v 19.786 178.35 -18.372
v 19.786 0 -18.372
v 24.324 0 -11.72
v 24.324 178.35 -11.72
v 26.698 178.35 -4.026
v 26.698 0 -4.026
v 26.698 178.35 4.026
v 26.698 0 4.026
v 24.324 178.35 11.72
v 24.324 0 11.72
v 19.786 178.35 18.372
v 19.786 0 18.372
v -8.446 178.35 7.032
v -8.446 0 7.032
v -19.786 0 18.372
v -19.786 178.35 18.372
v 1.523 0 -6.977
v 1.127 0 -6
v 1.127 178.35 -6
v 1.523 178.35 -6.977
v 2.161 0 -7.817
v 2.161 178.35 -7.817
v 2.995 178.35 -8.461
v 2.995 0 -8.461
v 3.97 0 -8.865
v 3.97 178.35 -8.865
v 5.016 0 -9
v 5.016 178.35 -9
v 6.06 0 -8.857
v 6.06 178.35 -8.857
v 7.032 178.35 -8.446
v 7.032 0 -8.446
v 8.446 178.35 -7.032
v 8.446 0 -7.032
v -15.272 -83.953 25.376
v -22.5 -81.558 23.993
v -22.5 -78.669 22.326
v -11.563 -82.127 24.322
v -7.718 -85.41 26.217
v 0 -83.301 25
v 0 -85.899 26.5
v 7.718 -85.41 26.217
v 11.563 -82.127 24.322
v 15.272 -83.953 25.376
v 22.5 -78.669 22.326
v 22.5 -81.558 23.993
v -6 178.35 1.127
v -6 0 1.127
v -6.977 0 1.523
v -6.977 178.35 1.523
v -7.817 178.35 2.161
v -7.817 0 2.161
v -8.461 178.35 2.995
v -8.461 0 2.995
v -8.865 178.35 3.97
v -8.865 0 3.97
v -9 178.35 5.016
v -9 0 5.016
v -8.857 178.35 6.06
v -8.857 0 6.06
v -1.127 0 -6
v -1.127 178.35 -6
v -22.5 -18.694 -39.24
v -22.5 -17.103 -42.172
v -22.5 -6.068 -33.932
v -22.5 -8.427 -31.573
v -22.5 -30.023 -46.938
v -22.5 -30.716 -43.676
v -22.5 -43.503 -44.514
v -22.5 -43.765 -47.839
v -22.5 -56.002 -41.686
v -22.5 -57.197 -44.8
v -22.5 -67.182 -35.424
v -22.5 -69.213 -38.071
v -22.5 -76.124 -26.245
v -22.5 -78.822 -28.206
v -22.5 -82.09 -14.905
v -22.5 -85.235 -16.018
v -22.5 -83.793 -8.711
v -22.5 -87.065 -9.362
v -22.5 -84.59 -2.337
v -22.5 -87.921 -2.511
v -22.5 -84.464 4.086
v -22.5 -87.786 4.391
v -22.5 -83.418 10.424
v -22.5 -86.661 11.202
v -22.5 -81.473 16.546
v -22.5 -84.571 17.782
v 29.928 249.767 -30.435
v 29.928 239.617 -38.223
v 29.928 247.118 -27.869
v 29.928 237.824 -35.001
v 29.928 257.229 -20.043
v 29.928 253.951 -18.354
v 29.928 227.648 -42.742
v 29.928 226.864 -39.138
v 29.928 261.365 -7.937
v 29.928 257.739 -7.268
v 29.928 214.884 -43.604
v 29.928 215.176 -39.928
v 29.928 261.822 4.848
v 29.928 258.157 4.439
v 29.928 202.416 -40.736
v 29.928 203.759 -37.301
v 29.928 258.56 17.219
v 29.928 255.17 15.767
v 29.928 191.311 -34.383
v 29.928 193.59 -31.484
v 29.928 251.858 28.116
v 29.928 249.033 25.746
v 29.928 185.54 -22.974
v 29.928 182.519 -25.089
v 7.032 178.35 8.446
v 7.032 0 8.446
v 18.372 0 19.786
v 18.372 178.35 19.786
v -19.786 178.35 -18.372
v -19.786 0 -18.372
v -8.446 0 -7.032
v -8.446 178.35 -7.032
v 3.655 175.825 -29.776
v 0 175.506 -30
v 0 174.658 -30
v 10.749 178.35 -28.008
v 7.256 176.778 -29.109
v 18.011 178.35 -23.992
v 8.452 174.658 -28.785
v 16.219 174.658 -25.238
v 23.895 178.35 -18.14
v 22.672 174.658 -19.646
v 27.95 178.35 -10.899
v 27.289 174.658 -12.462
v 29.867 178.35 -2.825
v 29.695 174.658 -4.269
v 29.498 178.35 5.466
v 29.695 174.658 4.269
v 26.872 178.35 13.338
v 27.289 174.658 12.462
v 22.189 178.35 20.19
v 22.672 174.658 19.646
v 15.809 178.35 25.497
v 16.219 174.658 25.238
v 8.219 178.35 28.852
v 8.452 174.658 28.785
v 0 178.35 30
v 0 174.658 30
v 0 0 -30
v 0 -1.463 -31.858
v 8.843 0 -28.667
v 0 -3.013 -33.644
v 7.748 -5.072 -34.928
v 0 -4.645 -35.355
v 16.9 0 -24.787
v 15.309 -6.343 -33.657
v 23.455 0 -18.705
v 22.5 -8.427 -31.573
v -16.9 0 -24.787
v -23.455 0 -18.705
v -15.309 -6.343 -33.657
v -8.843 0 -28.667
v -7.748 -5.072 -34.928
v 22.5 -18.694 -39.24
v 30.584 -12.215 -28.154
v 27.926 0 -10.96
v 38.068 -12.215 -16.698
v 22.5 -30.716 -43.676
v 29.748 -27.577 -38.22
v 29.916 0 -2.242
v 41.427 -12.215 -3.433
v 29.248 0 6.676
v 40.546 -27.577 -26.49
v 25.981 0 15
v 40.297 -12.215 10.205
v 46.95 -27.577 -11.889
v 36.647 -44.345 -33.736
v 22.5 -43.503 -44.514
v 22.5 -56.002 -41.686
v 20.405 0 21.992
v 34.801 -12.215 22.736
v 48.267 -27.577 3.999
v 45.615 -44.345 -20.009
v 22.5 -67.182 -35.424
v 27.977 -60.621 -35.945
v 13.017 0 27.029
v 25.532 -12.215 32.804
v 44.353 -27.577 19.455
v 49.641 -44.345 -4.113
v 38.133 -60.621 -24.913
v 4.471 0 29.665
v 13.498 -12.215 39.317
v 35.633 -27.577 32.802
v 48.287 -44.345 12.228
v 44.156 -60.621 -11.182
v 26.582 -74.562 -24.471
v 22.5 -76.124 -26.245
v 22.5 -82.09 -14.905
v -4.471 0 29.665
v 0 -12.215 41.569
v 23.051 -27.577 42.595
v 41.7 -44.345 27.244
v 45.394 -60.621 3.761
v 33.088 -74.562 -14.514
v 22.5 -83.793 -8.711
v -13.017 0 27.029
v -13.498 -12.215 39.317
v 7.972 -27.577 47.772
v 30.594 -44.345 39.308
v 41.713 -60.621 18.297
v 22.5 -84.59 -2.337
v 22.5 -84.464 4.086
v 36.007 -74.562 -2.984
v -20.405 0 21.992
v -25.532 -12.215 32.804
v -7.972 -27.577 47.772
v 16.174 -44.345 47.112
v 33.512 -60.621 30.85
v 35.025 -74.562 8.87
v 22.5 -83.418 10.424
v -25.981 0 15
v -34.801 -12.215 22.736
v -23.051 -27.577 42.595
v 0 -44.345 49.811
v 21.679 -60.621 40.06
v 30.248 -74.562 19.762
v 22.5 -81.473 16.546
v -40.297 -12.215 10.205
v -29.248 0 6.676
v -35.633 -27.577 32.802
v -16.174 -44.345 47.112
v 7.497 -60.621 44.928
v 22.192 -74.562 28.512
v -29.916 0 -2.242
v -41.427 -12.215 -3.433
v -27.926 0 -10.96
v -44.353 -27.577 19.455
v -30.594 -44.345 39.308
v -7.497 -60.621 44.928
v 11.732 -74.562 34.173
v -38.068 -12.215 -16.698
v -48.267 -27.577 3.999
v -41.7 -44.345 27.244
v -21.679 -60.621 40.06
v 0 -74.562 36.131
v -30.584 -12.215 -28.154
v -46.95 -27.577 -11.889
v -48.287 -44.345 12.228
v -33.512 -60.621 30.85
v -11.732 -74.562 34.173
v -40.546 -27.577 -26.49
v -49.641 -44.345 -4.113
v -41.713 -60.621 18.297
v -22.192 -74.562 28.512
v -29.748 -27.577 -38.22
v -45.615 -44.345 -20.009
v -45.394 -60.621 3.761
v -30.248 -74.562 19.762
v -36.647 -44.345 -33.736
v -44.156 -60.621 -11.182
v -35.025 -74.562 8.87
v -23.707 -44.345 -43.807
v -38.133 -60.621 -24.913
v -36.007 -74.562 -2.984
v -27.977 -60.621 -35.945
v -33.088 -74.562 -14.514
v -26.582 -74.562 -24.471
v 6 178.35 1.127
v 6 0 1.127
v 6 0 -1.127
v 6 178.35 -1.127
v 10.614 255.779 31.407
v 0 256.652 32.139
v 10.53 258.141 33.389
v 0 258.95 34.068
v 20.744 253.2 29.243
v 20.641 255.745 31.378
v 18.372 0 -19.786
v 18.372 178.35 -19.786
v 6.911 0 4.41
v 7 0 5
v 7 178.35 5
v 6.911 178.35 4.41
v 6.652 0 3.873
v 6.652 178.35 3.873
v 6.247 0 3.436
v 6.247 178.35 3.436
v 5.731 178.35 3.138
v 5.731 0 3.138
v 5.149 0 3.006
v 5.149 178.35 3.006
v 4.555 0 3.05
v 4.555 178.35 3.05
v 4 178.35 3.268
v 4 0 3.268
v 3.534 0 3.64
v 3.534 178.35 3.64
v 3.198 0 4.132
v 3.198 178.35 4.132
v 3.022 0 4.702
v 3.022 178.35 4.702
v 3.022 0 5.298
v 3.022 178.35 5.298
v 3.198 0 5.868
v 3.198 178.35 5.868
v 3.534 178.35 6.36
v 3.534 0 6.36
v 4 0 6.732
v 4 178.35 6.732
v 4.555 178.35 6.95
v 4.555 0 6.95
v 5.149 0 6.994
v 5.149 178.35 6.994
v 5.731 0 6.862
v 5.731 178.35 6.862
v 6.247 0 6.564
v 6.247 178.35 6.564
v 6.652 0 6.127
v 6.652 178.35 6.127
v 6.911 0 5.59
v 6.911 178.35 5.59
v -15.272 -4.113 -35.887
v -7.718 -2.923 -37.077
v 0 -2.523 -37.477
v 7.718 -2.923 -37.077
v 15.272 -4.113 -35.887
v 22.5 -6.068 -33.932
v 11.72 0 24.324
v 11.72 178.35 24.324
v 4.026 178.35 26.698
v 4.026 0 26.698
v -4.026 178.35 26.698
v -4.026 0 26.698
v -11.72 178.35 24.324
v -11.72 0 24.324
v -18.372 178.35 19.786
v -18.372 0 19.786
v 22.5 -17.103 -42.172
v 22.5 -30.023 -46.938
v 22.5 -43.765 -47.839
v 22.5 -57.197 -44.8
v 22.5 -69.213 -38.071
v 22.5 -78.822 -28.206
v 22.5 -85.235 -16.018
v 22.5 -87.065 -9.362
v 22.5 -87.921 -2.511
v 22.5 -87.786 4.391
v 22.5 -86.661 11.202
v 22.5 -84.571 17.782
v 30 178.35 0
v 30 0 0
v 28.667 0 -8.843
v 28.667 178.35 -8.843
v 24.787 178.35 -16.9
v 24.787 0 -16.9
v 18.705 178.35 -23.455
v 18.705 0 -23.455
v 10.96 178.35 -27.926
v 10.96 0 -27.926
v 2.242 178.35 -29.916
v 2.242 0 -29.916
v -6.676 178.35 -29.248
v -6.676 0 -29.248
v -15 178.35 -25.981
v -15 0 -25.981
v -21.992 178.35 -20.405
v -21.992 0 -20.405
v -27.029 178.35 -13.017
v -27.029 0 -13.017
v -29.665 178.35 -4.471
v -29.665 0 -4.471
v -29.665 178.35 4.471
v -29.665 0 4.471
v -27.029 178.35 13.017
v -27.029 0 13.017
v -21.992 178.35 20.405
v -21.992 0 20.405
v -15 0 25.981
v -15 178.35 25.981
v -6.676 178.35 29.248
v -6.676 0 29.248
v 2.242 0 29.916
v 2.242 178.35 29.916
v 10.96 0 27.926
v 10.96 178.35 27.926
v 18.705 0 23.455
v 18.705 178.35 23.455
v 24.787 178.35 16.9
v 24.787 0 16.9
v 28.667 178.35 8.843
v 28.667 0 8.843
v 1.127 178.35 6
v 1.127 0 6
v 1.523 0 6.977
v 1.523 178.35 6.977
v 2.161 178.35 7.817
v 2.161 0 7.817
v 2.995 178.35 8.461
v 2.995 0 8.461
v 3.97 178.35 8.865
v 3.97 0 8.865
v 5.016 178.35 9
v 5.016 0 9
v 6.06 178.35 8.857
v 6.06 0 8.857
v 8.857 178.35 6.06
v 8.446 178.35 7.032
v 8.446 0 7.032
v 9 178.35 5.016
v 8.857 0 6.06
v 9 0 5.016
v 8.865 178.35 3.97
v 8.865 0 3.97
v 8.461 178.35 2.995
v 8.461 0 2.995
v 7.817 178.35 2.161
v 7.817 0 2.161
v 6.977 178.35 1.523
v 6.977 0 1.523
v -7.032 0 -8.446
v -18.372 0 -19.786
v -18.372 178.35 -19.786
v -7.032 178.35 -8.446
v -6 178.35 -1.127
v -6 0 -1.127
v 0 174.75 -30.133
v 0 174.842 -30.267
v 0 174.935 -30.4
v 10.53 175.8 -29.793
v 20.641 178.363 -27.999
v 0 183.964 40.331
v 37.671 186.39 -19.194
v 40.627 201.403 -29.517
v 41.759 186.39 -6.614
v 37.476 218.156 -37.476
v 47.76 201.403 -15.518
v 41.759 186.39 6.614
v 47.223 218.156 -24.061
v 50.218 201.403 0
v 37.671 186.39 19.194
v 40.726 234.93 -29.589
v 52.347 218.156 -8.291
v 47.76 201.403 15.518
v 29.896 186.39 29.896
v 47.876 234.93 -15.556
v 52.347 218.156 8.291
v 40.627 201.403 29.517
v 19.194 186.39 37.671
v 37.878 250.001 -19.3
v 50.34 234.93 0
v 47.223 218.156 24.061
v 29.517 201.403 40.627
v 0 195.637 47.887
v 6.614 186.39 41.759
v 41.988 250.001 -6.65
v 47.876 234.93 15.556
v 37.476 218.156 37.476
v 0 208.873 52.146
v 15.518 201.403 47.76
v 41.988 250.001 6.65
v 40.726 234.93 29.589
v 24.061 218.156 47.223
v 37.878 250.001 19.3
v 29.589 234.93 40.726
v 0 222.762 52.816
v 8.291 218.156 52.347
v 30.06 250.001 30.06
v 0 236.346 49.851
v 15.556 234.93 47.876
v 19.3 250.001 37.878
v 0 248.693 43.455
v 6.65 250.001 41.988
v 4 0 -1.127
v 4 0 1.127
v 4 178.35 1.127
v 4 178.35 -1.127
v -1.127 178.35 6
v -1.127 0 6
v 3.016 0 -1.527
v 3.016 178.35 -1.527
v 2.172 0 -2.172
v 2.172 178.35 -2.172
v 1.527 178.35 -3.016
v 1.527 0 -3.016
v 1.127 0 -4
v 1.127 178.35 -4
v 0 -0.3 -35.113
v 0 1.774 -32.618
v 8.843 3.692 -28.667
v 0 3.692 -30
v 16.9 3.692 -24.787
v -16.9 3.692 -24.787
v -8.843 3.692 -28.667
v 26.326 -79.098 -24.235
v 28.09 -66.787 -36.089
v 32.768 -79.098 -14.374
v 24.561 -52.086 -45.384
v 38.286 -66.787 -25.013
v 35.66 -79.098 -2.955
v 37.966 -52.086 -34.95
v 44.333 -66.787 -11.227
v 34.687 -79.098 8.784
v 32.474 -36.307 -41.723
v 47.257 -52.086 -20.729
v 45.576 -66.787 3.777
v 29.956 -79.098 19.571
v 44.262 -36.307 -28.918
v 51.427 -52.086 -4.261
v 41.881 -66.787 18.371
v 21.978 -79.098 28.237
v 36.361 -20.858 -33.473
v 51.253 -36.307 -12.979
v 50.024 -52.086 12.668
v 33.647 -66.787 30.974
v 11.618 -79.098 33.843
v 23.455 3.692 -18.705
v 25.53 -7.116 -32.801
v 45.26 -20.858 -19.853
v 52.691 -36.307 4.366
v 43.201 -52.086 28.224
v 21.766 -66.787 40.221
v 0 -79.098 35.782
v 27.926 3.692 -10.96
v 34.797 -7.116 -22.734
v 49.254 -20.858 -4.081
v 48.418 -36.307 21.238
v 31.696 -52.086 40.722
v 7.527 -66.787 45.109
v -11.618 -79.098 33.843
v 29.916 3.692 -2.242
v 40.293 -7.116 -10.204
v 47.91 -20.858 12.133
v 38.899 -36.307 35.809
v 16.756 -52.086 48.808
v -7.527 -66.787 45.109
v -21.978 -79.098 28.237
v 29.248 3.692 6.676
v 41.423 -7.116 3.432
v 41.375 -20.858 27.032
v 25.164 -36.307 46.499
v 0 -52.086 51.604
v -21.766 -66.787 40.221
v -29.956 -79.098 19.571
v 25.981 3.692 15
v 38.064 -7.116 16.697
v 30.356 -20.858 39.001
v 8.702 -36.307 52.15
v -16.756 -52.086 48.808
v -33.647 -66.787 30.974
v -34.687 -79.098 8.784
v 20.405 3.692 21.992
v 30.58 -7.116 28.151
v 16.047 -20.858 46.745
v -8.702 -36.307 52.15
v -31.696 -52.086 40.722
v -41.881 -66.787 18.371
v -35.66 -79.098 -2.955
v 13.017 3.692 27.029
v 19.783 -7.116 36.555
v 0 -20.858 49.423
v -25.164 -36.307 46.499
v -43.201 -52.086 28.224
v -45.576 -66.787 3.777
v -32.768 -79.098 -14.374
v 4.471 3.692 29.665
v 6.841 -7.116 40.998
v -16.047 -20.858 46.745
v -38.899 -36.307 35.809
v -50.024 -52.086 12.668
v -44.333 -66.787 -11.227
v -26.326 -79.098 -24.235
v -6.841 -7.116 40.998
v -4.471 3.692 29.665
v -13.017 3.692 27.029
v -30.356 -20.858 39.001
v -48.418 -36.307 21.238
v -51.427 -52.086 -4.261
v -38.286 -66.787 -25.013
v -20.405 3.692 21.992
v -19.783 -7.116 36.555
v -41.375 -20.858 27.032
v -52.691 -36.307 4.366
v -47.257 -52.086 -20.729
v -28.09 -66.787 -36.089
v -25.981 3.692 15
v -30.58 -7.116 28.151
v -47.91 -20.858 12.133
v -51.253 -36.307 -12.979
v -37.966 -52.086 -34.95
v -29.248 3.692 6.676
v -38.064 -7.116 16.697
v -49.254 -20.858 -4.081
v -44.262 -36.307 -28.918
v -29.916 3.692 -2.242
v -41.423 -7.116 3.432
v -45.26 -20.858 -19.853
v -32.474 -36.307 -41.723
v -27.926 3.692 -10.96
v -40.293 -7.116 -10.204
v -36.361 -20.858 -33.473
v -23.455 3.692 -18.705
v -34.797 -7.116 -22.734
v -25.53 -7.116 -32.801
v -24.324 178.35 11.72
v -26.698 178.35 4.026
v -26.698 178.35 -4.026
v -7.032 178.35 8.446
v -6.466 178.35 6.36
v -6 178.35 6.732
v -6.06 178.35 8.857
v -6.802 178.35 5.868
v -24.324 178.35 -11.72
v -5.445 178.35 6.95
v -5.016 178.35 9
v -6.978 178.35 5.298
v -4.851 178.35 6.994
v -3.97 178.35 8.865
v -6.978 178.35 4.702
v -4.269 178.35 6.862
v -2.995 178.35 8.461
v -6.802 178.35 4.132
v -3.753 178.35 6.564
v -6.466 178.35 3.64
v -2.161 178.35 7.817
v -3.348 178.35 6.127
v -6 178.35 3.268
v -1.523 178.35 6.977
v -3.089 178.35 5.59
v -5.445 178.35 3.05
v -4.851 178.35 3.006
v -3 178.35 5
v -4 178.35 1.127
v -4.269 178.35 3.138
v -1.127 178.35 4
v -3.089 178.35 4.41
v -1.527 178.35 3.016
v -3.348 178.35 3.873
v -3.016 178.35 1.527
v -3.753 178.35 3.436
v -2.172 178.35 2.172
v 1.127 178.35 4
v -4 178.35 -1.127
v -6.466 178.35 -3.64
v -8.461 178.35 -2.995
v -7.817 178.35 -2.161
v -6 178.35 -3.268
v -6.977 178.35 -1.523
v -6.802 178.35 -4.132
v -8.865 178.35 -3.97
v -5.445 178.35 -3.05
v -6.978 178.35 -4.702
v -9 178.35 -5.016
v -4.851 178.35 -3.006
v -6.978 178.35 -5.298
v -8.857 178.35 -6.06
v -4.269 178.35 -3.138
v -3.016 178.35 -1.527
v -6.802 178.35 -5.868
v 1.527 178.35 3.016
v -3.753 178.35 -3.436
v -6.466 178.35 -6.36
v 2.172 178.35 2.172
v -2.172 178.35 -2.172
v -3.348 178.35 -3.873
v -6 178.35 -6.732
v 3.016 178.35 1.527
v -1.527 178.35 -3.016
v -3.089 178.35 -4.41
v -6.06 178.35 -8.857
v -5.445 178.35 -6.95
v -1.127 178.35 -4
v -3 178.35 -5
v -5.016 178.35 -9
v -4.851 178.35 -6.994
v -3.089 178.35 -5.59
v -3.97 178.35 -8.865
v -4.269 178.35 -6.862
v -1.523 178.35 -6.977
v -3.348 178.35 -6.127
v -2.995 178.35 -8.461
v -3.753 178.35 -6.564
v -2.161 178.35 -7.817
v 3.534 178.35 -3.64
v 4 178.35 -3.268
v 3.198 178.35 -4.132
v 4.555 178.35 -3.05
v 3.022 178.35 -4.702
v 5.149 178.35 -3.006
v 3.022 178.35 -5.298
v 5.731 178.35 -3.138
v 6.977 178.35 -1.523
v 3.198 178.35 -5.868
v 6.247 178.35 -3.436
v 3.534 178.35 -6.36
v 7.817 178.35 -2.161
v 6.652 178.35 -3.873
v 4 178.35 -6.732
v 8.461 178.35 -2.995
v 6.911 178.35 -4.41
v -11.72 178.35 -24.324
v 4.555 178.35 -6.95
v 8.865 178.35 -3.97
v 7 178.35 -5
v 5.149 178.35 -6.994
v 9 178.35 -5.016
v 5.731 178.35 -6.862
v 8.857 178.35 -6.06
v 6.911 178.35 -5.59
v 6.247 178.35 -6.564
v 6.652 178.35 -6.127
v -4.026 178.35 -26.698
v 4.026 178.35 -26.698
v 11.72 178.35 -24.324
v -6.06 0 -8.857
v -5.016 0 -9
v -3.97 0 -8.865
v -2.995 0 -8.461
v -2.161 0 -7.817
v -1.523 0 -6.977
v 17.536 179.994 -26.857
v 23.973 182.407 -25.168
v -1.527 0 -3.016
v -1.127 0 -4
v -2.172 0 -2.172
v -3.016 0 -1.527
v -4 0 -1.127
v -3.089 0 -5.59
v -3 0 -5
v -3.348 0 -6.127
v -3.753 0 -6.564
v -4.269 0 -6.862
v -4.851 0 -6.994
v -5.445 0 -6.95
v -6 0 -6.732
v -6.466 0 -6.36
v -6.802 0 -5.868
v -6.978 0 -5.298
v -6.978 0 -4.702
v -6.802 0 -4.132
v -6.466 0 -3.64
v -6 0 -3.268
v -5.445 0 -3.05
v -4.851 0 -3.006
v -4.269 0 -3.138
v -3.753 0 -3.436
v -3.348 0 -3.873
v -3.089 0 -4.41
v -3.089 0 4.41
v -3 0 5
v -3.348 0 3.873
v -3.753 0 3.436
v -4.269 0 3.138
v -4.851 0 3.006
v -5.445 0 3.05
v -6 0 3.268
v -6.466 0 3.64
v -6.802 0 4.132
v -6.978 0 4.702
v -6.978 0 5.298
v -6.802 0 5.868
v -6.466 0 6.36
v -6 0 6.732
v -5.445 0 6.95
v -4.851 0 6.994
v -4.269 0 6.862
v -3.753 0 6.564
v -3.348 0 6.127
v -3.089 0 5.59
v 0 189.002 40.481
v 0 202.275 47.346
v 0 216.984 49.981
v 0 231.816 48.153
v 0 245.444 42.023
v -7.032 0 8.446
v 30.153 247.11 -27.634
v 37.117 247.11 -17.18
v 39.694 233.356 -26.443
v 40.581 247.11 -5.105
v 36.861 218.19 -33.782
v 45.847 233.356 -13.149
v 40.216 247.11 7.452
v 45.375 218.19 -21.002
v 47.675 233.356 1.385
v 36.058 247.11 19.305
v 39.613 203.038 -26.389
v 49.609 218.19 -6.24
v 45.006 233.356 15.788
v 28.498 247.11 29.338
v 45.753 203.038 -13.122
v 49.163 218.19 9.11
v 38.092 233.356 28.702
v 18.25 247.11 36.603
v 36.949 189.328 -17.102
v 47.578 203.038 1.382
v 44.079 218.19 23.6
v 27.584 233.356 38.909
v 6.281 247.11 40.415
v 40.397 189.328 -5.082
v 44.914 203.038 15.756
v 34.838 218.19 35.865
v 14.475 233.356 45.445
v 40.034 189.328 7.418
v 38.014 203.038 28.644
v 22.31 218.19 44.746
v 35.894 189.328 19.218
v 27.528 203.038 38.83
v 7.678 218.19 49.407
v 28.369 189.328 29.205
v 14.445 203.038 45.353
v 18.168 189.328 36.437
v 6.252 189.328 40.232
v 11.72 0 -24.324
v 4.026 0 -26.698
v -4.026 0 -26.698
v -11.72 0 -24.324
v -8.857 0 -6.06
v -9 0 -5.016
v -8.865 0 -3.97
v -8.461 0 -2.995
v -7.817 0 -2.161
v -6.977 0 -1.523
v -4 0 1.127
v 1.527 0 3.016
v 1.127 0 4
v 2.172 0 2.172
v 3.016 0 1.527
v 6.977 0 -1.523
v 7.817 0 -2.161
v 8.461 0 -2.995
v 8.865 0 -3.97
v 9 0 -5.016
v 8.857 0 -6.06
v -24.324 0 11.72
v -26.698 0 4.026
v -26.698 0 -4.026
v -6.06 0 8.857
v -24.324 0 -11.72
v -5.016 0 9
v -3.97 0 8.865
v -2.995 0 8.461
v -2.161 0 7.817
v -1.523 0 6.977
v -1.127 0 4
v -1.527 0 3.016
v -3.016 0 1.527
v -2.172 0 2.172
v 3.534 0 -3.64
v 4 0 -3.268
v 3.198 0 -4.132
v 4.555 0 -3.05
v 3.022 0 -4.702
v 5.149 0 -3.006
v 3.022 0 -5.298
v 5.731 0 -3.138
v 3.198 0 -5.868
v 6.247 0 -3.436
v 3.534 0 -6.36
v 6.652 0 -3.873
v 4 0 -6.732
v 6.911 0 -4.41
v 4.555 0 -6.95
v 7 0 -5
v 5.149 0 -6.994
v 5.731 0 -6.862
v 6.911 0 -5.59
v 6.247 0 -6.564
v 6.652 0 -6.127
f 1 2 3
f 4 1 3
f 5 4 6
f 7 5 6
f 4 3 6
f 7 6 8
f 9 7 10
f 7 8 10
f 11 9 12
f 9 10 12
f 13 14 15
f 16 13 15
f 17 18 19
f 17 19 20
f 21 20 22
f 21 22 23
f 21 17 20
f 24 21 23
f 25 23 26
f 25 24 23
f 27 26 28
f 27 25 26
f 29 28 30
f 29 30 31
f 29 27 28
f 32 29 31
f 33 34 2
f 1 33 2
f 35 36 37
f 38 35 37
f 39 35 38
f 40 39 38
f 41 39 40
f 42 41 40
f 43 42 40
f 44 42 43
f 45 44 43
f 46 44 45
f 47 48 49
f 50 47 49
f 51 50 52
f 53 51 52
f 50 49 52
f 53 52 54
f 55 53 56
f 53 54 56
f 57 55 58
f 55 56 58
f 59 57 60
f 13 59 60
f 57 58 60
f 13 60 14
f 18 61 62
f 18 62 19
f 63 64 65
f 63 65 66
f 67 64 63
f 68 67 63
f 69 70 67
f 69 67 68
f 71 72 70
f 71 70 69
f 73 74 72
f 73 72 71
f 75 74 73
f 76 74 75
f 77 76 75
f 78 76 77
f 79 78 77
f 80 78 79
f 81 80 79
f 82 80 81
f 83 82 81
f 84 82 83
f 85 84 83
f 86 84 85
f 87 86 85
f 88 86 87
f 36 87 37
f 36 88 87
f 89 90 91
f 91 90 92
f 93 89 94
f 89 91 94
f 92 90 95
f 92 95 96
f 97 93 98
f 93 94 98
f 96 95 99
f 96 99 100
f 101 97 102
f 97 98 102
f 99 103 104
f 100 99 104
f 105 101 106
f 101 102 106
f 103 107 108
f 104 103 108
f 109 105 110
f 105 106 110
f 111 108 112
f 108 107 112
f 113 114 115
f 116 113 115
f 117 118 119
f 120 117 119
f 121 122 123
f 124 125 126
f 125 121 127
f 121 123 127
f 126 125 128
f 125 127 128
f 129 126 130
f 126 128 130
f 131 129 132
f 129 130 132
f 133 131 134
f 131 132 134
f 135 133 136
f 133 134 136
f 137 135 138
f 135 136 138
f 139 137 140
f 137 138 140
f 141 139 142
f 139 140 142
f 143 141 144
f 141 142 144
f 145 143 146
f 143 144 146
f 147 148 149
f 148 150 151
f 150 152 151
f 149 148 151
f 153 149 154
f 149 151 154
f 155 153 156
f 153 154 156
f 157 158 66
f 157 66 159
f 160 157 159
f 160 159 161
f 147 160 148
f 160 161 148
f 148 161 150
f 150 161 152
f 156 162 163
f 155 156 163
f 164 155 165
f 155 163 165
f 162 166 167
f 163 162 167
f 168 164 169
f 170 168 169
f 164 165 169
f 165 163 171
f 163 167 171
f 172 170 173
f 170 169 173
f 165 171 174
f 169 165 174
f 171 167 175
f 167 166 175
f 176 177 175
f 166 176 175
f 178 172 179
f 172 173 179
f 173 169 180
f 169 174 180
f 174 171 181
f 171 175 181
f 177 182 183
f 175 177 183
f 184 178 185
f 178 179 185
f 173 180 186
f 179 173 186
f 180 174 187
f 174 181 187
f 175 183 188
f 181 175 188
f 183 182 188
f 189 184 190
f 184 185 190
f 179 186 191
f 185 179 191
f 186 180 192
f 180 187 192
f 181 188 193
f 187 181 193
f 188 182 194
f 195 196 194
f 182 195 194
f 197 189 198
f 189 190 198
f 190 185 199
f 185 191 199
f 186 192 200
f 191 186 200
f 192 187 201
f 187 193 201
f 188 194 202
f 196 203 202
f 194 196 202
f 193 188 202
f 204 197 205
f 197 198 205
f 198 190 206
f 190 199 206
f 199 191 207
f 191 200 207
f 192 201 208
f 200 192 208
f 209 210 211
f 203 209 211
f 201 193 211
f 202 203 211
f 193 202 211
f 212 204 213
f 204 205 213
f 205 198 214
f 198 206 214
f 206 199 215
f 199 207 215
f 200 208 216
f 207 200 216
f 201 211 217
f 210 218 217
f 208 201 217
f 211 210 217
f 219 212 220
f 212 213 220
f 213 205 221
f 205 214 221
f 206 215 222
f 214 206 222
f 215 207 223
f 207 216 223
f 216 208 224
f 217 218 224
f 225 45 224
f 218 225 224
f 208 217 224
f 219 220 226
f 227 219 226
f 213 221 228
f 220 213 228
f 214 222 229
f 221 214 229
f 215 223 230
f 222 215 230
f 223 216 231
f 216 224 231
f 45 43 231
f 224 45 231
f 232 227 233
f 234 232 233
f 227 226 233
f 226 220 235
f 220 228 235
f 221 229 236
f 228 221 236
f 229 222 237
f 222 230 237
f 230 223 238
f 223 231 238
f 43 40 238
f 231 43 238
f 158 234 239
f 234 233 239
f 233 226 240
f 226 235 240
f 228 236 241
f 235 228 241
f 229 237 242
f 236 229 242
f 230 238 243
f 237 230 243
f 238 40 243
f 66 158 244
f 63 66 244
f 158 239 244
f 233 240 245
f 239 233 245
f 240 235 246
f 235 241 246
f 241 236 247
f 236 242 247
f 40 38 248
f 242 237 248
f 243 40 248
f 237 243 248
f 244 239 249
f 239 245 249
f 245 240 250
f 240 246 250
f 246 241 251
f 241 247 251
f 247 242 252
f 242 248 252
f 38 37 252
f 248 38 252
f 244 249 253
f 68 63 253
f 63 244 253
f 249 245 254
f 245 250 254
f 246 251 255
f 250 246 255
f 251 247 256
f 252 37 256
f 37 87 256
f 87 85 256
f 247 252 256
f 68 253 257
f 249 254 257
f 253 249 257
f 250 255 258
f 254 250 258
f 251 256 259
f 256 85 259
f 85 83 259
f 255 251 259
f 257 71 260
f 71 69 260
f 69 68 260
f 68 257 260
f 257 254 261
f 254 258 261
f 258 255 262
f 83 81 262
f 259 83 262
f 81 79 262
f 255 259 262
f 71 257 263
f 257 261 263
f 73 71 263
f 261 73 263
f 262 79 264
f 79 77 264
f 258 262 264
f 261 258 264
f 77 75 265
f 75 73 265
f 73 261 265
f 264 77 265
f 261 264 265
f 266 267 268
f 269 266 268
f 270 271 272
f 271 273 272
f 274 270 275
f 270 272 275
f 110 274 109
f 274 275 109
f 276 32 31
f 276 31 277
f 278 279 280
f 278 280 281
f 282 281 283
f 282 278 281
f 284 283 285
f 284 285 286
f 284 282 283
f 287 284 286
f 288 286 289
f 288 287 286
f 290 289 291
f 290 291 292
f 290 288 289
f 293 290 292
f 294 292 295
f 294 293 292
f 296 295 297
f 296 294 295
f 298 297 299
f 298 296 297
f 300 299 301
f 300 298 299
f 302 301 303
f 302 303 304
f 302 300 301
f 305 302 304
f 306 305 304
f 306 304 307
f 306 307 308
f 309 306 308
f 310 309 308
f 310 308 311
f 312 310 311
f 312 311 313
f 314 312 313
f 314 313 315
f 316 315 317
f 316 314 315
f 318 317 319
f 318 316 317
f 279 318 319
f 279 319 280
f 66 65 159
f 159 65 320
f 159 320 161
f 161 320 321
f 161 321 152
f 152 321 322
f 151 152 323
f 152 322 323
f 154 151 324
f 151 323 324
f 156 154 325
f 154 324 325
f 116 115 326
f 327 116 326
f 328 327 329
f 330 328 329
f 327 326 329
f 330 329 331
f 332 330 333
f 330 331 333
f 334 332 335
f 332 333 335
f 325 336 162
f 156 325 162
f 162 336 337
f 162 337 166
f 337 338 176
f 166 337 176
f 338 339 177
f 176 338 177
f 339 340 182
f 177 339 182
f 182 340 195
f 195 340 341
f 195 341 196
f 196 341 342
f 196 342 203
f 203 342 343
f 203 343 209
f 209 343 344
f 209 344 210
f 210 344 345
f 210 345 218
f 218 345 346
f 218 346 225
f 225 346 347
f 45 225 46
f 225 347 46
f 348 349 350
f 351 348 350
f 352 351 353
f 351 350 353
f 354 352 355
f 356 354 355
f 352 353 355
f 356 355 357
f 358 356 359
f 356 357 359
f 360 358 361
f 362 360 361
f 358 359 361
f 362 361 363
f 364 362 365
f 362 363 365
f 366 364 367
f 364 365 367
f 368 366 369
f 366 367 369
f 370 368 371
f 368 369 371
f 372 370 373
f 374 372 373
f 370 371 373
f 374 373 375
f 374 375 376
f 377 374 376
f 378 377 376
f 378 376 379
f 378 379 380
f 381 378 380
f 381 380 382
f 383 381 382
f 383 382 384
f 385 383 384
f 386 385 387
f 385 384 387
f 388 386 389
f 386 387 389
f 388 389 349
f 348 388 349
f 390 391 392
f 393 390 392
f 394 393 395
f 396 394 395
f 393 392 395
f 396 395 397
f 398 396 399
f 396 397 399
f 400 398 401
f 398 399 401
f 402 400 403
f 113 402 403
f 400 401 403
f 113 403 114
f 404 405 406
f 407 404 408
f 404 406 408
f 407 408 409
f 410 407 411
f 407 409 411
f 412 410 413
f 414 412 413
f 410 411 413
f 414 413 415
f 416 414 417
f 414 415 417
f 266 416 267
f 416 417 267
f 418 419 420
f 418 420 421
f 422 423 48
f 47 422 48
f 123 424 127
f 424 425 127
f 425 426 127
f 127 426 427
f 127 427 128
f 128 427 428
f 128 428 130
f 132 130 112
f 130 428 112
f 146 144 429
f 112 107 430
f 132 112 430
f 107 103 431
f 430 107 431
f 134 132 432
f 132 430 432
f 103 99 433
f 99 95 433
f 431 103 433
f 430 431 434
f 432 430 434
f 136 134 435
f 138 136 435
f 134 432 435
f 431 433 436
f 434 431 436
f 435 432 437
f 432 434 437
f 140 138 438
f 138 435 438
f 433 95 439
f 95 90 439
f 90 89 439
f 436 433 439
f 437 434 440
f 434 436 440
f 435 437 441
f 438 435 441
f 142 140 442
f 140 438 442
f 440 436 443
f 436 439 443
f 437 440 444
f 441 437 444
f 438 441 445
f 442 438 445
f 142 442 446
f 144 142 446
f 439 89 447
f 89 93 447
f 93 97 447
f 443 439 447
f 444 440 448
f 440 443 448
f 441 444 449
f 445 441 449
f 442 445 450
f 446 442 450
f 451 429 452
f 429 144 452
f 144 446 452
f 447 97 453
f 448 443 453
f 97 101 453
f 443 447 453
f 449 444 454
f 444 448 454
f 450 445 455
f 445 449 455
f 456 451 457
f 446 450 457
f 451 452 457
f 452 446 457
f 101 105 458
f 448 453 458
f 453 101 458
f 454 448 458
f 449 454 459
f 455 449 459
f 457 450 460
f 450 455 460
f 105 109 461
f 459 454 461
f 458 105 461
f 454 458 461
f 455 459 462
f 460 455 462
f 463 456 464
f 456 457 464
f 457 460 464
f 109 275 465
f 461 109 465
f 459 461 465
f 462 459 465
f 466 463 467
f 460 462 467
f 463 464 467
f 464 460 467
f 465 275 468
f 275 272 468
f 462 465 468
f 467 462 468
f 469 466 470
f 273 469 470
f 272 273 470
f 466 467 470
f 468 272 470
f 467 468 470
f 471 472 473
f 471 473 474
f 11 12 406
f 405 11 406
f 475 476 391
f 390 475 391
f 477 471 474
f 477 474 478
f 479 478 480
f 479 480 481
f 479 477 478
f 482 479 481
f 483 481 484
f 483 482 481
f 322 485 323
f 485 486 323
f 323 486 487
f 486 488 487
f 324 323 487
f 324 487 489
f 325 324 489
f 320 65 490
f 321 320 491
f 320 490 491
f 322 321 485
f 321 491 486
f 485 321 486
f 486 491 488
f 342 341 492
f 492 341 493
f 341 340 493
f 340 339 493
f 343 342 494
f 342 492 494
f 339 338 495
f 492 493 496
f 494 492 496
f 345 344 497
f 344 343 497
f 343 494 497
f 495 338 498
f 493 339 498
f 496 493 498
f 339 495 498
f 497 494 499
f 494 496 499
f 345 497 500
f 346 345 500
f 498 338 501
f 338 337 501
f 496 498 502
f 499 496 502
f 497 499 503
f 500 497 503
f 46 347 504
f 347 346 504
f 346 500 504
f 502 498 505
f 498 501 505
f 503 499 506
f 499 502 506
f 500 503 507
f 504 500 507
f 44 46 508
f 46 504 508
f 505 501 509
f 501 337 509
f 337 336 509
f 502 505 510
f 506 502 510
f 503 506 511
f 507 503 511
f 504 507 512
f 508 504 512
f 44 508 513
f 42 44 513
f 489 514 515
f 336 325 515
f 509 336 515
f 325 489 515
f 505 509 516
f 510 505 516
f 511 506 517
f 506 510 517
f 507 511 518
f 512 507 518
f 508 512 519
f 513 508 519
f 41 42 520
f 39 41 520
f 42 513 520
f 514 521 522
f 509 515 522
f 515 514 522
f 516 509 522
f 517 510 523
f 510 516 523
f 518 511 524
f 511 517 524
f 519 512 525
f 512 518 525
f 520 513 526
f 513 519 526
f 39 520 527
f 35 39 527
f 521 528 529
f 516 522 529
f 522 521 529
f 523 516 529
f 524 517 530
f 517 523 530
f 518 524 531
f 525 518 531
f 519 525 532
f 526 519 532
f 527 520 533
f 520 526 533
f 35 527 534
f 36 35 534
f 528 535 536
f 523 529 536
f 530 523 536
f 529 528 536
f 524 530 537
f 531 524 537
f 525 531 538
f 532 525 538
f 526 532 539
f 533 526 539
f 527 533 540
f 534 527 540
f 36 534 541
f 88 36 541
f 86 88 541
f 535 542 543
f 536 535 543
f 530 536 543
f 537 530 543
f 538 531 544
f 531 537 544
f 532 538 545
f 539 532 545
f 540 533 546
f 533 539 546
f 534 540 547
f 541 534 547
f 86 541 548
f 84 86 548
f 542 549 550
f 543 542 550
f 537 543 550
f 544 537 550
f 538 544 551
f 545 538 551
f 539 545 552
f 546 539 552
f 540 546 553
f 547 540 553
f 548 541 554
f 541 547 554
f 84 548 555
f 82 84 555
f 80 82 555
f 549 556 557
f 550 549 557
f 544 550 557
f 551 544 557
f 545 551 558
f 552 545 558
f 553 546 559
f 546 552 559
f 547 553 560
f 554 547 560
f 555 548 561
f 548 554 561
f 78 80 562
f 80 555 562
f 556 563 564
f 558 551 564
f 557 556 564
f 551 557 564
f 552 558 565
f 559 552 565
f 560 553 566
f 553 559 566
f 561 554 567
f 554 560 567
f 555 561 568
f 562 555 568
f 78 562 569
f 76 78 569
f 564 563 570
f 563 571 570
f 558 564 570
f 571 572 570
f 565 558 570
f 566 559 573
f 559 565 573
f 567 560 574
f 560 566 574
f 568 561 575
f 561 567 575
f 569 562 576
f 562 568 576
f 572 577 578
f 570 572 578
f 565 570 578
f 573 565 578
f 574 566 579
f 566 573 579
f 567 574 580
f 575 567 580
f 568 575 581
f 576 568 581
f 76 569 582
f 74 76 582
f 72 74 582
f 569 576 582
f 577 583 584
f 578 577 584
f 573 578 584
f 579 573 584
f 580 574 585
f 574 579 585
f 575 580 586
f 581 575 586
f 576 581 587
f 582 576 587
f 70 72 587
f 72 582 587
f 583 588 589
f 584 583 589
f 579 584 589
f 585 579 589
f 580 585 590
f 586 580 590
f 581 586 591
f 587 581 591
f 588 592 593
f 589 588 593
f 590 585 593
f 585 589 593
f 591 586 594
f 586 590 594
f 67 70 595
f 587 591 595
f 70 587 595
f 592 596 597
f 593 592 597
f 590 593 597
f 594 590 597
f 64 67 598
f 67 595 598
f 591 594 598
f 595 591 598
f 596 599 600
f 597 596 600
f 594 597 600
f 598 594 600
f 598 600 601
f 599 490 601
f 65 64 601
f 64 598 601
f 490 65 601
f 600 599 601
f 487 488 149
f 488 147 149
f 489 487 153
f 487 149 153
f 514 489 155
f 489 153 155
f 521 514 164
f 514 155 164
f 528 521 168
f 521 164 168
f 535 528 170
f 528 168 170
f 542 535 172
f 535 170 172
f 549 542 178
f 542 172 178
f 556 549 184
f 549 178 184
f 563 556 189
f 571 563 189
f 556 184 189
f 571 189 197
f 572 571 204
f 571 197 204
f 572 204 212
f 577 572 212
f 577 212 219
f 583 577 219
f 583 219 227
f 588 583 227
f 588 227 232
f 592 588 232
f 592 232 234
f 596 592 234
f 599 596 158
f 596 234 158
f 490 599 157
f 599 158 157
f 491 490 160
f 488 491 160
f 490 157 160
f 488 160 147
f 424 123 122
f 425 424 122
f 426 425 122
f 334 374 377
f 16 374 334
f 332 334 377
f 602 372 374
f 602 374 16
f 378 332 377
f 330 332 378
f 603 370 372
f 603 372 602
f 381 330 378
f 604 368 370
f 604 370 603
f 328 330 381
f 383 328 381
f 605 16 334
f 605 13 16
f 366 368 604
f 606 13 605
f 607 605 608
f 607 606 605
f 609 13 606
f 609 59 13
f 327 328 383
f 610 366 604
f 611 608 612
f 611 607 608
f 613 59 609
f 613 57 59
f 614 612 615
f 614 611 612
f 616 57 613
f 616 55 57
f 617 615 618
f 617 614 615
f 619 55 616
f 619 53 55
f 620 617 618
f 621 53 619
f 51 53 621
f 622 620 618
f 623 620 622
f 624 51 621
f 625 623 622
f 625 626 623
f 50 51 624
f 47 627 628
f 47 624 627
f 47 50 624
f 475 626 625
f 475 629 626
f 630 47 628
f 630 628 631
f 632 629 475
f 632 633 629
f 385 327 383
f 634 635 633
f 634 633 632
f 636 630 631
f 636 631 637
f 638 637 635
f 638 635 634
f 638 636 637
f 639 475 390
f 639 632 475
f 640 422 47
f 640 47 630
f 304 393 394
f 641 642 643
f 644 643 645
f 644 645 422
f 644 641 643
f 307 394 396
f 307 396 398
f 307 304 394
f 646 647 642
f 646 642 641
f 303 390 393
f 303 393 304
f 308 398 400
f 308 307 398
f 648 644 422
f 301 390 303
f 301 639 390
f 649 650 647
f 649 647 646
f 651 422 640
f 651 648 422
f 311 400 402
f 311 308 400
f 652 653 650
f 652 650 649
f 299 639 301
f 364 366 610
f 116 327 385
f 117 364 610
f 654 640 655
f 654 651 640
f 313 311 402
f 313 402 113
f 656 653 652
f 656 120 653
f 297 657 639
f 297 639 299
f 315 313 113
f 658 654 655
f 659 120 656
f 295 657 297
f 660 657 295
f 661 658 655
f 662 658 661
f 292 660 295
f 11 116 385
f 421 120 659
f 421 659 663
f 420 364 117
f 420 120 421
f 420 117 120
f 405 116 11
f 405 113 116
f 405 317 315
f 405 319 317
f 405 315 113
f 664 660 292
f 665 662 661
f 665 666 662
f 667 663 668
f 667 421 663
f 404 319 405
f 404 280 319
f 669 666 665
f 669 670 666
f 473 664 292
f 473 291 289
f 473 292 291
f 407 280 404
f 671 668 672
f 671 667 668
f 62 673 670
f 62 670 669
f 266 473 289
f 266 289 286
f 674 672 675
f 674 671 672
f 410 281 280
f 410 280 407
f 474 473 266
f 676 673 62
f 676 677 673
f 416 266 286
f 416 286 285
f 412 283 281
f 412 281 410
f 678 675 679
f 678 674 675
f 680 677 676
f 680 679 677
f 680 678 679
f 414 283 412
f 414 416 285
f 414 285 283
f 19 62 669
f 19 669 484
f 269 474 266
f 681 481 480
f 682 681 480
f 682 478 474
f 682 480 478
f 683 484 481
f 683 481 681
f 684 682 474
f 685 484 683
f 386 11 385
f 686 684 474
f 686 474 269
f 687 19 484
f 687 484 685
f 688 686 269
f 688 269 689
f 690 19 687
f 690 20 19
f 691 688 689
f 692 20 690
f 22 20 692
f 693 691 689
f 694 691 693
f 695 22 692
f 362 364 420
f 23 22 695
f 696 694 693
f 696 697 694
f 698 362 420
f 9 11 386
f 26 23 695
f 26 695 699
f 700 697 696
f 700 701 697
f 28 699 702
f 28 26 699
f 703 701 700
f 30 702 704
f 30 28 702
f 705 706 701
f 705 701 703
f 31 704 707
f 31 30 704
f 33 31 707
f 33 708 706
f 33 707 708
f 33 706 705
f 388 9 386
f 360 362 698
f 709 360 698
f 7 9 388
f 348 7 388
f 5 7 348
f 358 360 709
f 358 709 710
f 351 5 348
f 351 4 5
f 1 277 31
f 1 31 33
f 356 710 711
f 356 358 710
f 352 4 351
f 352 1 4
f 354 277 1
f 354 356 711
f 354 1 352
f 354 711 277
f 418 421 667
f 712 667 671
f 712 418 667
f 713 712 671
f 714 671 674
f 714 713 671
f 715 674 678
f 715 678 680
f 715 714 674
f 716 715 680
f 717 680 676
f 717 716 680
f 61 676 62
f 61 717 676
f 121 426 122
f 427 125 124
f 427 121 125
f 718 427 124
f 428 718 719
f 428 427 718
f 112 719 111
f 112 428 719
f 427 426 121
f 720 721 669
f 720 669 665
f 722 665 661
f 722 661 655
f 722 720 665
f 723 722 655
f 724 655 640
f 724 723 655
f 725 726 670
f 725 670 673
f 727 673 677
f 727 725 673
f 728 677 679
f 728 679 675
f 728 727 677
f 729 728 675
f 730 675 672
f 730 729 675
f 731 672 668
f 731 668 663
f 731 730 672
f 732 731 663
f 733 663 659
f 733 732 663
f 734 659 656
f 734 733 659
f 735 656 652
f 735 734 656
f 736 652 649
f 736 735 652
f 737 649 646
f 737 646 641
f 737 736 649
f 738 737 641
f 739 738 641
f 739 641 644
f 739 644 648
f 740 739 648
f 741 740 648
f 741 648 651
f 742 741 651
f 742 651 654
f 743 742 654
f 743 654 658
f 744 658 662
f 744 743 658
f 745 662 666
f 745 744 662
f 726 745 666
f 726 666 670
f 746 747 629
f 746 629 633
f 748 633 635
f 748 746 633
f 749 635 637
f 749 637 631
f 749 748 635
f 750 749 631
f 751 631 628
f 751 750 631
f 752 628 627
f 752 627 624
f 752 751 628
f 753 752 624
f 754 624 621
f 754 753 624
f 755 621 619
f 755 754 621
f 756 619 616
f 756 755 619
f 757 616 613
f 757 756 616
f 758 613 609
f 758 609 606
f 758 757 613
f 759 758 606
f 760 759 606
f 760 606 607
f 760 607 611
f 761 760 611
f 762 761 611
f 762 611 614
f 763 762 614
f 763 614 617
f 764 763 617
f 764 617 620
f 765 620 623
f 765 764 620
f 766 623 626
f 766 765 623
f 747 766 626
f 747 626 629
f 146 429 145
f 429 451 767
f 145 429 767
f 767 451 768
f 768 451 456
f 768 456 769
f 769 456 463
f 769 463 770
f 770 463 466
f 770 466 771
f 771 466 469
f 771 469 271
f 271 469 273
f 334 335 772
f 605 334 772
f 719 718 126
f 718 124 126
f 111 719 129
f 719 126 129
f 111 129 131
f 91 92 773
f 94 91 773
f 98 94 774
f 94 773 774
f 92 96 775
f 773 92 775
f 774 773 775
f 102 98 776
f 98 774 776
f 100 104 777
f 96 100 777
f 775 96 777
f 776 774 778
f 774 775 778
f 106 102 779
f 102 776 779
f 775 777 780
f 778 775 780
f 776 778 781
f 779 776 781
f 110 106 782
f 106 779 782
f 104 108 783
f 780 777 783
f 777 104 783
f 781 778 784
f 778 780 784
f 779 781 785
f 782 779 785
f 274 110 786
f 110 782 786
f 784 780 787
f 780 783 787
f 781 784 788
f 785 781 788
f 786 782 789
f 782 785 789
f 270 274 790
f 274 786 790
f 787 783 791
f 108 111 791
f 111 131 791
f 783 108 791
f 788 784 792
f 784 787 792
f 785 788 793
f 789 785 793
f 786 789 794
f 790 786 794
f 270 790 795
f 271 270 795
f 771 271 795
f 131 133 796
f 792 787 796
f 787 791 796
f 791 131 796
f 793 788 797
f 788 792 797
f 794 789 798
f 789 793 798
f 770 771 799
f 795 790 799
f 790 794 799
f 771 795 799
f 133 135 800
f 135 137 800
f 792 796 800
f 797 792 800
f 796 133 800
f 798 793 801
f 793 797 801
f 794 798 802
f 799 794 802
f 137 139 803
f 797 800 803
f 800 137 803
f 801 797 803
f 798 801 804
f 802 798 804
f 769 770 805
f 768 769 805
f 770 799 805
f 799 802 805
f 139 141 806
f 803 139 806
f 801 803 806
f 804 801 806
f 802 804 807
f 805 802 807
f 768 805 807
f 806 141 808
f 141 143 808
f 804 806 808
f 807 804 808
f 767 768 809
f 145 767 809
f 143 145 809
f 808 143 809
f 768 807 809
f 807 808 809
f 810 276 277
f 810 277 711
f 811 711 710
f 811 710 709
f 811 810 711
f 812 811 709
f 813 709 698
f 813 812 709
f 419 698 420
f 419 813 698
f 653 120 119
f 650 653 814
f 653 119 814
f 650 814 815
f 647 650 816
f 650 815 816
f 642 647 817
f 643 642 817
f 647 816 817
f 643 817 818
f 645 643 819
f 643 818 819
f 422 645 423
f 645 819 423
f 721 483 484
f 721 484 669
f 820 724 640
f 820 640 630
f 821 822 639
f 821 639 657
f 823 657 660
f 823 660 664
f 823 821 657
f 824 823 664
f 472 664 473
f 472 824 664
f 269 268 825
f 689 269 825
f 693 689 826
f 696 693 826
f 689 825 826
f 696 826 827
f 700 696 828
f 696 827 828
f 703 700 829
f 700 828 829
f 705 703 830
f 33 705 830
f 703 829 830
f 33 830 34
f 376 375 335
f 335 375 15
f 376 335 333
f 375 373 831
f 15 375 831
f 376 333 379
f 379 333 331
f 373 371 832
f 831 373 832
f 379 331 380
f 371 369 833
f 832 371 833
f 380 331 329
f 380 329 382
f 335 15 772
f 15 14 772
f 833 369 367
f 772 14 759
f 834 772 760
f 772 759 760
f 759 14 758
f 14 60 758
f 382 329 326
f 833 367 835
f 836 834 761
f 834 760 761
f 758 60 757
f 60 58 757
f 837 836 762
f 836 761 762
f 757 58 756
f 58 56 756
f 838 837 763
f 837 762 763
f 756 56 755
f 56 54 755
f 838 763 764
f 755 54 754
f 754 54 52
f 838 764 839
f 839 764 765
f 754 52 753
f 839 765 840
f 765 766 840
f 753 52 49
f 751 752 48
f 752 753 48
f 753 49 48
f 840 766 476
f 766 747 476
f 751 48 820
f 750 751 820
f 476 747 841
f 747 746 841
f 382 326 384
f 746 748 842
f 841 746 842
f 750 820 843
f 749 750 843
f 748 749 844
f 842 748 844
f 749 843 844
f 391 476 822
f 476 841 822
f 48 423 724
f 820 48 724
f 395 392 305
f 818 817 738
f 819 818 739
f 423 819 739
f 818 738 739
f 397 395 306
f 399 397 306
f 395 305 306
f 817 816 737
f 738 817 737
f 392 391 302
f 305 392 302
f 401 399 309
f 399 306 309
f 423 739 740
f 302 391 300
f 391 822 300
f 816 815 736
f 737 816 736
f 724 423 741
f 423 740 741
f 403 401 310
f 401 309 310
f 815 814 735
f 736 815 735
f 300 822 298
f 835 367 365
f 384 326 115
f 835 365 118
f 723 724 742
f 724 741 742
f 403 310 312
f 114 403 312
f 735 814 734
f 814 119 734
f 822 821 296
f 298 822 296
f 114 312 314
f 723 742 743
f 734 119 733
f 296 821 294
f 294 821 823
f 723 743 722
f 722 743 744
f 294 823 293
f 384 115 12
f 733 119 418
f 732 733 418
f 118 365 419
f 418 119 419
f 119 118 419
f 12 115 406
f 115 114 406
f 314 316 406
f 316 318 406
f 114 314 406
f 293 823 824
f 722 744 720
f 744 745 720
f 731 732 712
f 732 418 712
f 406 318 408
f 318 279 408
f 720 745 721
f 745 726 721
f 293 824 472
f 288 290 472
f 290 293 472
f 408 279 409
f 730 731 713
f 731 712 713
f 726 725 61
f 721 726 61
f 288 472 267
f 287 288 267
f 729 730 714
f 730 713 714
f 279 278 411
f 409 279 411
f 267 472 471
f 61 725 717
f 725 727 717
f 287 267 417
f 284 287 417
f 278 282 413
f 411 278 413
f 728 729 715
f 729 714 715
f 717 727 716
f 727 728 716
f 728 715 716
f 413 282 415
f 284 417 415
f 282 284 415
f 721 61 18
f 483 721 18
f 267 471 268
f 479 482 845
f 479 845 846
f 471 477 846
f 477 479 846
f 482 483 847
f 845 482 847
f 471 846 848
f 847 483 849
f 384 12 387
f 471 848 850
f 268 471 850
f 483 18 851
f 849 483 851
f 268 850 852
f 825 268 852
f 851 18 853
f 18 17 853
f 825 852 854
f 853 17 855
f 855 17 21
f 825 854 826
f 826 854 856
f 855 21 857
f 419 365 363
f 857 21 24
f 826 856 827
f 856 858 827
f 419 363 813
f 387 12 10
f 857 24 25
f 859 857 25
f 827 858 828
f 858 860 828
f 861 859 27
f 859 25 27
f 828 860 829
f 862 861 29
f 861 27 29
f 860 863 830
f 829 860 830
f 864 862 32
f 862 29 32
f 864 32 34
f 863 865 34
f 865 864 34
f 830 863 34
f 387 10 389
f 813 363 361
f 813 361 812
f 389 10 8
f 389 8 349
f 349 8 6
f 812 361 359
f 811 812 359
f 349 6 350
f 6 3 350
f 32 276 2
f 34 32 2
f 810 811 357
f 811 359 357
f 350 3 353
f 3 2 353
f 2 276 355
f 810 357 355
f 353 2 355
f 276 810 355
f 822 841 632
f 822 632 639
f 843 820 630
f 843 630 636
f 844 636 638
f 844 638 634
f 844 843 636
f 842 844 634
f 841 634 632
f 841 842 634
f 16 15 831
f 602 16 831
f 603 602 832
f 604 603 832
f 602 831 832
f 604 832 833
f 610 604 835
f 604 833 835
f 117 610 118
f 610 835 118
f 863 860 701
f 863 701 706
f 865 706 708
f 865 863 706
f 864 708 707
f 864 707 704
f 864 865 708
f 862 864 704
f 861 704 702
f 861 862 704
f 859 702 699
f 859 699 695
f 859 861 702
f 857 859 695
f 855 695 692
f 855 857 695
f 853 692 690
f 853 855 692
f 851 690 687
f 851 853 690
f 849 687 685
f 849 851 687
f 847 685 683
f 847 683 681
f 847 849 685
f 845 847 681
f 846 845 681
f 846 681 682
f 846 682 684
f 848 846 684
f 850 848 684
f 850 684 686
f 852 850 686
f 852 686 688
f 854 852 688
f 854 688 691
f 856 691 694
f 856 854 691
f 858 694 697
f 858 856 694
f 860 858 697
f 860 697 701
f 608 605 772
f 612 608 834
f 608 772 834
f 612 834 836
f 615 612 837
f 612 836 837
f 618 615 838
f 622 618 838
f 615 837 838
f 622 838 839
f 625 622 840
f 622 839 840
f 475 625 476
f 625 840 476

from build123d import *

# Parameters (mm, degrees)
SKETCH_7_R                = 30
SKETCH_7_R_2              = 2
EXTRUDE_1_DEPTH           = 178.35
REVOLVE_1_ANGLE           = 180
SKETCH_13_W               = 62
SKETCH_13_H               = 63.428923534
REVOLVE_2_ANGLE           = 130
REVOLVE_2_OTHER_WAY_ANGLE = 55
SKETCH_15_W               = 45
SKETCH_15_H               = 69.245097843
REVOLVE_6_ANGLE           = 45
REVOLVE_6_OTHER_WAY_ANGLE = 120


with BuildPart() as part:
    # 草图7 → 凸台-拉伸1 (new body)
    with BuildSketch(Plane(origin=(0, 0, 0), x_dir=(1, 0, 0), z_dir=(0, 1, 0))):
        Circle(SKETCH_7_R)
        with Locations((5, 5)):
            Circle(SKETCH_7_R_2, mode=Mode.SUBTRACT)
        with Locations((5, -5)):
            Circle(SKETCH_7_R_2, mode=Mode.SUBTRACT)
        with Locations((-5, -5)):
            Circle(SKETCH_7_R_2, mode=Mode.SUBTRACT)
        with Locations((-5, 5)):
            Circle(SKETCH_7_R_2, mode=Mode.SUBTRACT)
        with BuildLine():
            Line((7.031506006, 8.445719569), (18.371677247, 19.78589081))
            ThreePointArc((18.371677247, 19.78589081), (0, 27), (-18.371677247, 19.78589081))
            Line((-18.371677247, 19.78589081), (-7.031506006, 8.445719569))
            ThreePointArc((-7.031506006, 8.445719569), (-3.469266271, 8.69551813), (-1.127016654, 6))
            Line((-1.127016654, 6), (1.127016654, 6))
            ThreePointArc((1.127016654, 6), (3.469266271, 8.69551813), (7.031506006, 8.445719569))
        make_face(mode=Mode.SUBTRACT)
        with BuildLine():
            Line((8.445719569, 7.031506006), (19.78589081, 18.371677247))
            ThreePointArc((19.78589081, 18.371677247), (27, 0), (19.78589081, -18.371677247))
            Line((19.78589081, -18.371677247), (8.445719569, -7.031506006))
            ThreePointArc((8.445719569, -7.031506006), (8.69551813, -3.469266271), (6, -1.127016654))
            Line((6, -1.127016654), (6, 1.127016654))
            ThreePointArc((6, 1.127016654), (8.69551813, 3.469266271), (8.445719569, 7.031506006))
        make_face(mode=Mode.SUBTRACT)
        with BuildLine():
            Line((7.031506006, -8.445719569), (18.371677247, -19.78589081))
            ThreePointArc((18.371677247, -19.78589081), (0, -27), (-18.371677247, -19.78589081))
            Line((-18.371677247, -19.78589081), (-7.031506006, -8.445719569))
            ThreePointArc((-7.031506006, -8.445719569), (-3.469266271, -8.69551813), (-1.127016654, -6))
            Line((-1.127016654, -6), (1.127016654, -6))
            ThreePointArc((1.127016654, -6), (3.469266271, -8.69551813), (7.031506006, -8.445719569))
        make_face(mode=Mode.SUBTRACT)
        with BuildLine():
            Line((-8.445719569, -7.031506006), (-19.78589081, -18.371677247))
            ThreePointArc((-19.78589081, -18.371677247), (-27, 0), (-19.78589081, 18.371677247))
            Line((-19.78589081, 18.371677247), (-8.445719569, 7.031506006))
            ThreePointArc((-8.445719569, 7.031506006), (-8.69551813, 3.469266271), (-6, 1.127016654))
            Line((-6, 1.127016654), (-6, -1.127016654))
            ThreePointArc((-6, -1.127016654), (-8.69551813, -3.469266271), (-8.445719569, -7.031506006))
        make_face(mode=Mode.SUBTRACT)
        with BuildLine():
            Line((1.127016654, 4), (-1.127016654, 4))
            ThreePointArc((-1.127016654, 4), (-2.171572875, 2.171572875), (-4, 1.127016654))
            Line((-4, 1.127016654), (-4, -1.127016654))
            ThreePointArc((-4, -1.127016654), (-2.171572875, -2.171572875), (-1.127016654, -4))
            Line((-1.127016654, -4), (1.127016654, -4))
            ThreePointArc((1.127016654, -4), (2.171572875, -2.171572875), (4, -1.127016654))
            Line((4, -1.127016654), (4, 1.127016654))
            ThreePointArc((4, 1.127016654), (2.171572875, 2.171572875), (1.127016654, 4))
        make_face(mode=Mode.SUBTRACT)
    extrude(amount=EXTRUDE_1_DEPTH)


with BuildPart() as body_2:
    # 草图8 → 旋转1 (revolve)
    with BuildSketch(Plane(origin=(0, 0, 0), x_dir=(0, 0, -1), z_dir=(1, 0, 0))):
        with BuildLine():
            Line((0, 271.35), (0, 268.35))
            ThreePointArc((0, 268.35), (47.434164903, 234.161388301), (30, 178.35))
            Line((30, 178.35), (30, 174.65789545))
            ThreePointArc((30, 174.65789545), (50.619569048, 234.055388547), (0, 271.35))
        make_face()
    revolve(axis=Axis((0, 218.35, 0), (0, -1, 0)), revolution_arc=REVOLVE_1_ANGLE)


with BuildPart() as body_3:
    # 草图14 → 旋转3 (revolve)
    with BuildSketch(Plane(origin=(0, 0, 0), x_dir=(0, 0, -1), z_dir=(1, 0, 0))):
        with BuildLine():
            Line((30, 3.69210455), (30, 0))
            ThreePointArc((30, 0), (47.434164903, -55.811388301), (0, -90))
            Line((0, -90), (0, -93))
            ThreePointArc((0, -93), (50.619569048, -55.705388547), (30, 3.69210455))
        make_face()
    revolve(axis=Axis((0, 0, 0), (0, -1, 0)))


with BuildPart() as body_4:
    # 草图13 → 旋转2 (revolve)
    with BuildSketch(Plane(origin=(0, 218.35, 0), x_dir=(1, 0, 0), z_dir=(0, 1, 0))):
        with Locations((-1.07172831, 63.714461767)):
            Rectangle(SKETCH_13_W, SKETCH_13_H)
    revolve(axis=Axis((-30.13148335, 218.35, 0), (1, 0, 0)), revolution_arc=REVOLVE_2_ANGLE)

    # 草图13 → 旋转2 other way (revolve)
    with BuildSketch(Plane(origin=(0, 218.35, 0), x_dir=(1, 0, 0), z_dir=(0, 1, 0))):
        with Locations((-1.07172831, 63.714461767)):
            Rectangle(SKETCH_13_W, SKETCH_13_H)
    revolve(axis=Axis((-30.13148335, 218.35, 0), (-1, 0, 0)), revolution_arc=REVOLVE_2_OTHER_WAY_ANGLE)


with BuildPart() as body_5:
    # 草图15 → 旋转6 (revolve)
    with BuildSketch(Plane(origin=(0, -40, 0), x_dir=(1, 0, 0), z_dir=(0, 1, 0))):
        with Locations((0, 34.622548922)):
            Rectangle(SKETCH_15_W, SKETCH_15_H)
    revolve(axis=Axis((-74.394272535, -40, 0), (1, 0, 0)), revolution_arc=REVOLVE_6_ANGLE)

    # 草图15 → 旋转6 other way (revolve)
    with BuildSketch(Plane(origin=(0, -40, 0), x_dir=(1, 0, 0), z_dir=(0, 1, 0))):
        with Locations((0, 34.622548922)):
            Rectangle(SKETCH_15_W, SKETCH_15_H)
    revolve(axis=Axis((-74.394272535, -40, 0), (-1, 0, 0)), revolution_arc=REVOLVE_6_OTHER_WAY_ANGLE)


with BuildPart() as body_2_1:
    add(body_2.part)

    # Combine 1: cut body 4
    add(body_4.part, mode=Mode.SUBTRACT)


with BuildPart() as body_3_1:
    add(body_3.part)

    # Combine 2: cut body 5
    add(body_5.part, mode=Mode.SUBTRACT)


solid = Compound([part.part, body_2_1.part, body_3_1.part])
